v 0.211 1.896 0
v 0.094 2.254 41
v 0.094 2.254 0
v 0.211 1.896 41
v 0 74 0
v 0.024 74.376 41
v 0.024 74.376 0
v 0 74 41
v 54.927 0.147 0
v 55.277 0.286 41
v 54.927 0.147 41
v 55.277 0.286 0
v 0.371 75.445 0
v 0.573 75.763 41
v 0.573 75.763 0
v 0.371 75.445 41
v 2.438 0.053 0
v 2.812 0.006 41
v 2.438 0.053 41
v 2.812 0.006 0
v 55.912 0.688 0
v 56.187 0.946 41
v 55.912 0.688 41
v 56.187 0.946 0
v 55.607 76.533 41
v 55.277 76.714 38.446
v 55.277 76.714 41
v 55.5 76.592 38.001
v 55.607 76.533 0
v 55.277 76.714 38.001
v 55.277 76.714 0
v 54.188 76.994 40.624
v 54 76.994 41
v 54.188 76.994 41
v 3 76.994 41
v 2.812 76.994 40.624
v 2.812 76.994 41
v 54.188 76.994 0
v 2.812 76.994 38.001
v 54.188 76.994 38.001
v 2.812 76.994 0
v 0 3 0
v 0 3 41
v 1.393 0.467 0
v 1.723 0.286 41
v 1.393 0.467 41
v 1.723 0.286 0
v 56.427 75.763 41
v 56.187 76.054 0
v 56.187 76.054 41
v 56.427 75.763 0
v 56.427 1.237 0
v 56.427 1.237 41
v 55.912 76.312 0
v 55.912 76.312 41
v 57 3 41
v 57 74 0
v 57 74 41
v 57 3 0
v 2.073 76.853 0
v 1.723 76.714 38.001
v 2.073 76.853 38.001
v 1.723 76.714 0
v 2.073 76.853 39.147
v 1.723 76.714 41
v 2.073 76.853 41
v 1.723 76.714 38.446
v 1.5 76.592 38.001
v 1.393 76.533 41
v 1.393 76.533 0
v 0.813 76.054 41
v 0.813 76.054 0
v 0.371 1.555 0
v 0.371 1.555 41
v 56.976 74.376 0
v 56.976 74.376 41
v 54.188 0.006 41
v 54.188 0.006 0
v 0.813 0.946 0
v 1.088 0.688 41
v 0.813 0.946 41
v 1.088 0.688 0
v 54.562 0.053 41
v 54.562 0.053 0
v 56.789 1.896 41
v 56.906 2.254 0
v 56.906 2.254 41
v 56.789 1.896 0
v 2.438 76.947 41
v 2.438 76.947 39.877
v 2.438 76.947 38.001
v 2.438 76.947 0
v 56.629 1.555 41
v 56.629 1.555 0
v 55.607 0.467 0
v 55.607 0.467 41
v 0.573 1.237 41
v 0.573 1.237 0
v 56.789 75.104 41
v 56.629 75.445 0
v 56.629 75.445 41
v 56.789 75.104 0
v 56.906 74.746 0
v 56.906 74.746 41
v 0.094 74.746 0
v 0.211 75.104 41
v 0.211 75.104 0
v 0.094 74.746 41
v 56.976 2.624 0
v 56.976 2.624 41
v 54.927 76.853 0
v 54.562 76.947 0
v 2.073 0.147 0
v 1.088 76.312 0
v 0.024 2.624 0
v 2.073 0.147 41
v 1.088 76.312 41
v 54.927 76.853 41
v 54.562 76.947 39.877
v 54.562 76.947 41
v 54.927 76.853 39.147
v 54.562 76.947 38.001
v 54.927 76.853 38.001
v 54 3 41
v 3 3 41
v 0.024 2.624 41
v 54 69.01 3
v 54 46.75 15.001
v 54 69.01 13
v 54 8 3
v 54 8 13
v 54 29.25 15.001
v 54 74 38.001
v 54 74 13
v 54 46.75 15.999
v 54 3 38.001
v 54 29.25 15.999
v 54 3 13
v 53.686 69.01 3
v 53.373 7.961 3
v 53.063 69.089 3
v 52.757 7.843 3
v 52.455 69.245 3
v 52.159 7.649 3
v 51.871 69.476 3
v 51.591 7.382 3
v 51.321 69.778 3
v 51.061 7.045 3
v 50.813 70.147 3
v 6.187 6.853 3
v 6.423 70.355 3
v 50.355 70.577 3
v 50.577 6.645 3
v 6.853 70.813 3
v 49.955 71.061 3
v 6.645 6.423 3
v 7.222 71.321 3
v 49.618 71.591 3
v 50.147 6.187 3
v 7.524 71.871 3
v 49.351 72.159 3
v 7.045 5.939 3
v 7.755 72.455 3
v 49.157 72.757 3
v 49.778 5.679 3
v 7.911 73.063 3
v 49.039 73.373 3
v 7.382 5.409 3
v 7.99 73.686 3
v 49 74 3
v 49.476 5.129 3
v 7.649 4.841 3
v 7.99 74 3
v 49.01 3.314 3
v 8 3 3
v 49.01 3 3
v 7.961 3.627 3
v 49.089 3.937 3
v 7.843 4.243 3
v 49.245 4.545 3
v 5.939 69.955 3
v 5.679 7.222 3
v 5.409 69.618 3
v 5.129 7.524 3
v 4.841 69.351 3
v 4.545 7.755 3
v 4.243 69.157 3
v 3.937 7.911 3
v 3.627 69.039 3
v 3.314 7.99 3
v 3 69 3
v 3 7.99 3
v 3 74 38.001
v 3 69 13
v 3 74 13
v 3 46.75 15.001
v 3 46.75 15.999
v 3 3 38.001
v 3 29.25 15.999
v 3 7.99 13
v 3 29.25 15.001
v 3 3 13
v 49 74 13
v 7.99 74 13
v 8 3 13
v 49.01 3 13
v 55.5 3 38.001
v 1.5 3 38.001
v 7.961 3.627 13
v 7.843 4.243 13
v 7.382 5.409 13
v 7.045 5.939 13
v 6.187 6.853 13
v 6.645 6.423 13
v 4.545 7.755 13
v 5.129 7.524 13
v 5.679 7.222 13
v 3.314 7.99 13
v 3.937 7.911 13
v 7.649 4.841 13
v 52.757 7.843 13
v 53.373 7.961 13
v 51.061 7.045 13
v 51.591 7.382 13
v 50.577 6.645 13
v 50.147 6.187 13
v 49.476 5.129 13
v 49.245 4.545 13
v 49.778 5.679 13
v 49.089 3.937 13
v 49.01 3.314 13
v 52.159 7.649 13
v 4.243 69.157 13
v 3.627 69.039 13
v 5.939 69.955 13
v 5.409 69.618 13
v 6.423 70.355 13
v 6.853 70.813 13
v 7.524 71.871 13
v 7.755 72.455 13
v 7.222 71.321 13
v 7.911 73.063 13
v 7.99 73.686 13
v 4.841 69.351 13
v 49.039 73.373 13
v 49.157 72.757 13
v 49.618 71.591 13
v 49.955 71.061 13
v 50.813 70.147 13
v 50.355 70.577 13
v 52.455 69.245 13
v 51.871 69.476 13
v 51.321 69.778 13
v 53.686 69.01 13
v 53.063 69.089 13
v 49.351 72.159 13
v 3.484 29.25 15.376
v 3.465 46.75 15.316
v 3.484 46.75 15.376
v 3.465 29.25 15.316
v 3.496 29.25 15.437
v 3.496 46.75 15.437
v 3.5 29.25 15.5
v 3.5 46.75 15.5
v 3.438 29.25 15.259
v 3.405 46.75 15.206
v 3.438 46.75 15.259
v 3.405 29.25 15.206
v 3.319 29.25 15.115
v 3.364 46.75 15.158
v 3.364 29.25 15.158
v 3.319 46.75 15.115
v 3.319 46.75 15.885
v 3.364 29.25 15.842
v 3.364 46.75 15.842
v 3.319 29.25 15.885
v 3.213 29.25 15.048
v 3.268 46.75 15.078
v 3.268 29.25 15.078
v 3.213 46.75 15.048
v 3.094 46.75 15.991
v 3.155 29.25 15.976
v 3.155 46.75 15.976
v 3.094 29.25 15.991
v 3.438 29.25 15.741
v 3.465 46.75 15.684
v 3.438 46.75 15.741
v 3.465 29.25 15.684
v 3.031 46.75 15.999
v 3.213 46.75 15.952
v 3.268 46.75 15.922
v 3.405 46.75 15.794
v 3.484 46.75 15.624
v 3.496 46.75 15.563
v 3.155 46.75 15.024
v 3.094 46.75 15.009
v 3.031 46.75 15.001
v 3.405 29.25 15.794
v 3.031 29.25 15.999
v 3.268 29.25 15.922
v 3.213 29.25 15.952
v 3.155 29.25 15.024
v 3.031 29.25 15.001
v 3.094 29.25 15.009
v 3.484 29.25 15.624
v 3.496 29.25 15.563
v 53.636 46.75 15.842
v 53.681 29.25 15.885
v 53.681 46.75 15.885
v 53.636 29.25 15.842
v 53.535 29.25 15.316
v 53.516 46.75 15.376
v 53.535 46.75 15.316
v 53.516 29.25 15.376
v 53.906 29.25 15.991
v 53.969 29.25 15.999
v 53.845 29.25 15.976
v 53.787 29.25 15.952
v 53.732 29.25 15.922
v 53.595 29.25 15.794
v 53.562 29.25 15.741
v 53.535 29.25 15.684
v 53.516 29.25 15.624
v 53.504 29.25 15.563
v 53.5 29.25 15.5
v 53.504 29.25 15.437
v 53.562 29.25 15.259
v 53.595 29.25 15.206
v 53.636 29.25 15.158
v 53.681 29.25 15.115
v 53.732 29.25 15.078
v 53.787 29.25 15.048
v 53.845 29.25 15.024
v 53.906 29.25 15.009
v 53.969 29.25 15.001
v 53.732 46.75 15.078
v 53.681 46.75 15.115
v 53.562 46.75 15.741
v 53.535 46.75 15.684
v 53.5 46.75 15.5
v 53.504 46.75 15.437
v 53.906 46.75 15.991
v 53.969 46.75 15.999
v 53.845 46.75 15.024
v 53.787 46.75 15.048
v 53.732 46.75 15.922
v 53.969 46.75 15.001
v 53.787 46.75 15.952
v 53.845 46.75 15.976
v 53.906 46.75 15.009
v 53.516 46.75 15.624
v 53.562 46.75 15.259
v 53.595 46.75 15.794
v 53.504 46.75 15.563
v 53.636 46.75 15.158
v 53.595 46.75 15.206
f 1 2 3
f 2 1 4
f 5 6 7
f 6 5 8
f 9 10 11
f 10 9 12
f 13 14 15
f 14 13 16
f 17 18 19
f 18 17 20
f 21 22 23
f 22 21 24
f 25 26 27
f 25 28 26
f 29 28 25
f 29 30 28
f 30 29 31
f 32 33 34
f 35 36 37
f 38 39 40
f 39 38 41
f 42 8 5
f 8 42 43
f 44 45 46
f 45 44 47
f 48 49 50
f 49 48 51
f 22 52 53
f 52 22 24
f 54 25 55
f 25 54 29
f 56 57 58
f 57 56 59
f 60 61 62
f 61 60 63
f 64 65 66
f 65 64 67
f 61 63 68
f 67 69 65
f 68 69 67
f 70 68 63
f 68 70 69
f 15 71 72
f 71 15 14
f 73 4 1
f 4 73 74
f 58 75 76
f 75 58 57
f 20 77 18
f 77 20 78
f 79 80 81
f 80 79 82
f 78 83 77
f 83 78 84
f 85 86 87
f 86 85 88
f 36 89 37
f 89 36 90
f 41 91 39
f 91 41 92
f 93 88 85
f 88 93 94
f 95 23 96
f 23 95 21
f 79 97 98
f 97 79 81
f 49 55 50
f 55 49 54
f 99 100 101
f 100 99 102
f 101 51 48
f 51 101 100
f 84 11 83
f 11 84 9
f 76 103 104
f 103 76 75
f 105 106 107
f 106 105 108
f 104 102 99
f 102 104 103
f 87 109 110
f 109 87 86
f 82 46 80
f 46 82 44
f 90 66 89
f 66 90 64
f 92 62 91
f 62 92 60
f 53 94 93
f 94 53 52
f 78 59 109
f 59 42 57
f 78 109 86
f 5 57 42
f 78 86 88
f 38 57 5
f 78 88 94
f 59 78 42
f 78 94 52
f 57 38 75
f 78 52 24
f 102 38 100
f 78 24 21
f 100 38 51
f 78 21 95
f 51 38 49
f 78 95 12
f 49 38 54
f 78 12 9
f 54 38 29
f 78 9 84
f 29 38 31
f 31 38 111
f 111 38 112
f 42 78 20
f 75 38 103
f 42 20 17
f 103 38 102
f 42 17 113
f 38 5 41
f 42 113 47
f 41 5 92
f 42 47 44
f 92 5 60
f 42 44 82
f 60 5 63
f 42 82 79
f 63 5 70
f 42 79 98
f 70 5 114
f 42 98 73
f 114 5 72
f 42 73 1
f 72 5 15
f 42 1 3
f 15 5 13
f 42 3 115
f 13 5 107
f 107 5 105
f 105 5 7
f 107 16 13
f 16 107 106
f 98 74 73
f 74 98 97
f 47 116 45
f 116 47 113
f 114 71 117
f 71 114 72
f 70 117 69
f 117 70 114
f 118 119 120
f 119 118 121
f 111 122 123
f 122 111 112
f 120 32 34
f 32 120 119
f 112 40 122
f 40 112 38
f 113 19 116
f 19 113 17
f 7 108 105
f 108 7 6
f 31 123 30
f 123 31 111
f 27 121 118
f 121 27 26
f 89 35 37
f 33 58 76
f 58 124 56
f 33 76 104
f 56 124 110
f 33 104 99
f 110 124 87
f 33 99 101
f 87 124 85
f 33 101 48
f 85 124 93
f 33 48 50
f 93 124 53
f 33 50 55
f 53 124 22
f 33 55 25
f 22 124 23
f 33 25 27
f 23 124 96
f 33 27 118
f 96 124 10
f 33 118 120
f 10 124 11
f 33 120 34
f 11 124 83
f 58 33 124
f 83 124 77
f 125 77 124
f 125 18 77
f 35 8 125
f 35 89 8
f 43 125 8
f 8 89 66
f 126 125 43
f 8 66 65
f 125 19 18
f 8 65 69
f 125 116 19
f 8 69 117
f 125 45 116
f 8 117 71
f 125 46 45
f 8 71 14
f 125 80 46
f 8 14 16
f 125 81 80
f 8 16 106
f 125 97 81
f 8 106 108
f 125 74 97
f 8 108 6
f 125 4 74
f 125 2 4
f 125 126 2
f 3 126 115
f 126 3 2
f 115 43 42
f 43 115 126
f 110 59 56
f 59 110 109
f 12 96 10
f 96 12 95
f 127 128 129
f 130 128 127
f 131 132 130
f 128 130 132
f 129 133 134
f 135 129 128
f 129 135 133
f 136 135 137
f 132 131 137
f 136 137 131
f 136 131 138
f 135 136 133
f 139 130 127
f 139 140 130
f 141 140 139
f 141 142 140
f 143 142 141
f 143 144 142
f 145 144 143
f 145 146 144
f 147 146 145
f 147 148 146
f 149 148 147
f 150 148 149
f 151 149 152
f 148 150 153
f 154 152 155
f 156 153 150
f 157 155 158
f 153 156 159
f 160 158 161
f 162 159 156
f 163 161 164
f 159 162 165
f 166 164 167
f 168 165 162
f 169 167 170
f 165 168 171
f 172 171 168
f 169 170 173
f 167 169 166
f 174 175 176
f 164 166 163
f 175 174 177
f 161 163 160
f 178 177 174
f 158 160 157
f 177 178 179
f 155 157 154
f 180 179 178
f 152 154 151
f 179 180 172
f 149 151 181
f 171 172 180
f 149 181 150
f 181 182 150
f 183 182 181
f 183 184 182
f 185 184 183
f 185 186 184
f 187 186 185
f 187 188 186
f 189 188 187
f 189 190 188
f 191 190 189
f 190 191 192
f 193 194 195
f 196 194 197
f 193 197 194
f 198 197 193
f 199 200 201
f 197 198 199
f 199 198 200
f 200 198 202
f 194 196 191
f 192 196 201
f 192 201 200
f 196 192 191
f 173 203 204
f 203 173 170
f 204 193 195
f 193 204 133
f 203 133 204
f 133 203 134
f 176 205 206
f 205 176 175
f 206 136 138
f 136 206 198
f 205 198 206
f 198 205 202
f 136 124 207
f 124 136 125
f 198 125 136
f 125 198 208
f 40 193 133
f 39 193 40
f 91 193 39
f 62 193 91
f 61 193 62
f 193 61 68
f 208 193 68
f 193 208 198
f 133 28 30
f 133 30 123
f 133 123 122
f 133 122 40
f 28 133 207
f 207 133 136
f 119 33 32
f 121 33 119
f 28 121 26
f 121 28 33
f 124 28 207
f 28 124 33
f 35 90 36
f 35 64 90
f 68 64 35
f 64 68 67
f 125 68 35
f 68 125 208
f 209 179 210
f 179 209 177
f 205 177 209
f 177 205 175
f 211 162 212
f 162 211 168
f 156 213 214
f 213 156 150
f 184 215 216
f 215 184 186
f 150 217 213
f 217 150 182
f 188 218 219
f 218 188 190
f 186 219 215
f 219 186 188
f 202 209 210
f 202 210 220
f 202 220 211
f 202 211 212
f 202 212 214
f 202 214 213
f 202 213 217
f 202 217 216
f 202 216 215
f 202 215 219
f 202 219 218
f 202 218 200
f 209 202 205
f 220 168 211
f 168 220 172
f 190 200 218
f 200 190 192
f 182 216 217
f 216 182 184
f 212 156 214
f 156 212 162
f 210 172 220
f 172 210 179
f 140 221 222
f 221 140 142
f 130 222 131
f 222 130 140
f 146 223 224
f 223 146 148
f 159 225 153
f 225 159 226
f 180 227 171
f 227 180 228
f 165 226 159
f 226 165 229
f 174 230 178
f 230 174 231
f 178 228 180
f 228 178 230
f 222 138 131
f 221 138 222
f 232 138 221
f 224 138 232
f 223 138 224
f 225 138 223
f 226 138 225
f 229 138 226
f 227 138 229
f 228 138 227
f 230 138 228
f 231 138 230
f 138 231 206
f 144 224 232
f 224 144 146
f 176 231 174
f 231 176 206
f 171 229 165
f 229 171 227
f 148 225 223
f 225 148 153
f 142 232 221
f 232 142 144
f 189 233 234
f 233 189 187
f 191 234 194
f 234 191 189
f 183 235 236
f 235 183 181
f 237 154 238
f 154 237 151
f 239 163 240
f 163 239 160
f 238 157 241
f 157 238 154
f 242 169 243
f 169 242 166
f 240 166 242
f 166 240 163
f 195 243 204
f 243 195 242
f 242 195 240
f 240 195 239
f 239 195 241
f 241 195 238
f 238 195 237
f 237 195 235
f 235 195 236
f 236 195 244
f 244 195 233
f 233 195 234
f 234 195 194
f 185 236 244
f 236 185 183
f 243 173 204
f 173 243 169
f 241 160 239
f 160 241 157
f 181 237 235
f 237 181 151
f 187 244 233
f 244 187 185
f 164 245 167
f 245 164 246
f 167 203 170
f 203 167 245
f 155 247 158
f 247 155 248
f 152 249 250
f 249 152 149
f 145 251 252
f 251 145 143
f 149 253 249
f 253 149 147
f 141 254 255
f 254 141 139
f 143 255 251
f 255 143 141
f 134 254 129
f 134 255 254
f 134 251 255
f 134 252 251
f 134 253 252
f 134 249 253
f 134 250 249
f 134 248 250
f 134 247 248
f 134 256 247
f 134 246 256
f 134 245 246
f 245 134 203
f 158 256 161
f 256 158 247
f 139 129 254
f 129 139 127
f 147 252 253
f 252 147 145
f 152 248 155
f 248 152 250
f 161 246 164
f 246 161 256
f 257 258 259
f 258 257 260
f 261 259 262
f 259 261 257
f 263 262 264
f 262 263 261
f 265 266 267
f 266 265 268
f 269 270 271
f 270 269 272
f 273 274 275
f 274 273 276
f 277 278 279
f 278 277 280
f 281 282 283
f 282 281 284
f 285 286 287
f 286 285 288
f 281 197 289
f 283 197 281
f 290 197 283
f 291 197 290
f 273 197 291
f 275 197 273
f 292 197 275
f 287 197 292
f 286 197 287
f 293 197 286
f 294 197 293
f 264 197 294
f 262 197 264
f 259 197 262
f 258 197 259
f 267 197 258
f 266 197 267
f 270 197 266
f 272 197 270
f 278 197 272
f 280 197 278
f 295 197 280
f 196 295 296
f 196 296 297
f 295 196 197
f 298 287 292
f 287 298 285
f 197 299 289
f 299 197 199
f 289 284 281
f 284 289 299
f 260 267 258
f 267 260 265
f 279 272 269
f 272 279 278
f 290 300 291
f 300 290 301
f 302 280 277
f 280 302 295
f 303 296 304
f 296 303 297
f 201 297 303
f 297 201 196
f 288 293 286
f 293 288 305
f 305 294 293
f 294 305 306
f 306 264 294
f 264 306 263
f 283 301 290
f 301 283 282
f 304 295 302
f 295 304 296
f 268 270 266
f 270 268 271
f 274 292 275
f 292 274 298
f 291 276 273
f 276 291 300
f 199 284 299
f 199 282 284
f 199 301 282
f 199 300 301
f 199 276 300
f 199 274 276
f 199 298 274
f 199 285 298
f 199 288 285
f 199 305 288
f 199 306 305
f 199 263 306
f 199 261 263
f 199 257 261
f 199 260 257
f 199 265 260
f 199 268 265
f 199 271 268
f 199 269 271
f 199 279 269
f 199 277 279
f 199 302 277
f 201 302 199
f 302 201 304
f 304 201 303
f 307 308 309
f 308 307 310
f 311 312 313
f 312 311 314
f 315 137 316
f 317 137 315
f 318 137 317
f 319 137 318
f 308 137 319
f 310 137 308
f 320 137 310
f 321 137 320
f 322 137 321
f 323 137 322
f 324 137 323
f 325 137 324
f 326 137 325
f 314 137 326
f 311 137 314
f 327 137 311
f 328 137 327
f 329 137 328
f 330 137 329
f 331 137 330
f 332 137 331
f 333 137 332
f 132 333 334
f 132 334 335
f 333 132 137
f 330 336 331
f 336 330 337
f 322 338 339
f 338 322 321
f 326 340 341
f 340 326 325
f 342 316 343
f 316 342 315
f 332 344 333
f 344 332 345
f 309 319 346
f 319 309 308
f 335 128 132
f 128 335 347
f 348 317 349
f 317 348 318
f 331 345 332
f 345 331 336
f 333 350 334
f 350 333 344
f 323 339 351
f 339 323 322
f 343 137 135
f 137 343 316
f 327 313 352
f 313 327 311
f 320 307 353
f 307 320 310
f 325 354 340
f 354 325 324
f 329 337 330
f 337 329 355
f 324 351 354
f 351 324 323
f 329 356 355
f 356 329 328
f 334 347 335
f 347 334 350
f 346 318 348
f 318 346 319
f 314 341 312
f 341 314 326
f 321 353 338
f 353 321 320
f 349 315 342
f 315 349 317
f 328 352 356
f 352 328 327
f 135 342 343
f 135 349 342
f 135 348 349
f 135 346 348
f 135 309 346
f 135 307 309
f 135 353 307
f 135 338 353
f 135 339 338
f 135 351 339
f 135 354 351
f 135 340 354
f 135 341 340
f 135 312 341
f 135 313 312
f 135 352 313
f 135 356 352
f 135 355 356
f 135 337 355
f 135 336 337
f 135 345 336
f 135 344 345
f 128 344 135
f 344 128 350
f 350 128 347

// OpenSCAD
/* Project box

   A parametric box for electronics projects using perforated circuit boards. The
   board is held above the bottom of the box by four corner supports, and snaps
   into place to hold it snugly while allowing easy removal.
*/

$fn=50;

mode = "case";         // ["case", "lid", "all"]
board_x = 50;
board_y = 70;
board_thickness = 1;   // [1:10]
clearance_above = 20;  // [5:50]
clearance_below = 10;  // [5:50]
fit_tolerance = 0.5;
corner_radius=3;       // [1:10]
support_radius=5;      // [1:10]
wall_width=3;          // [3:10]

module _rounded_box(h, w, d, r) {
  hull() {
    translate([0 + r,0 + r,0])
      cylinder(h=h,r=r);
    translate([w - r,0 + r,0])
      cylinder(h=h, r=r);
    translate([w - r,d - r,0])
      cylinder(h=h, r=r);
    translate([0 + r,d - r,0])
      cylinder(h=h, r=r);
  }

}

module corner_post(h, r) {
  intersection() {
    translate([-0.001,-0.001,-0.001])
      cube([r*1.1, r*1.1, h*1.2]);
    cylinder(h=h, r=r);
  }
}

module lid_base(x, y, z, slot_depth=1.5) {
  polyhedron([// bottom face
              [0, 0, 0],
              [x, 0, 0],
              [x, y, 0],
              [0, y, 0],
              // top face
              [slot_depth, 0, z],
              [x - slot_depth, 0, z],
              [x - slot_depth, y, z],
              [slot_depth, y, z]],
             [[0,1,2,3],
              [4,5,1,0],
              [7,6,5,4],
              [5,6,2,1],
              [6,7,3,2],
              [7,4,0,3]]);
}

module lid(x, y, z, slot_depth=1.5, wall_width=3, fit_tolerance=0.5) {
  indent_width = x / 4;
  difference() {
    union() {
      lid_base(x, y, z, slot_depth);
      translate([x / 2 - indent_width / 2 - fit_tolerance, y - wall_width - fit_tolerance, 0])
        rotate([0, 90, 0])
        cylinder(h=x / 4, r=2*fit_tolerance);
    }
    translate([x / 2 - indent_width / 2 - fit_tolerance, y - wall_width - fit_tolerance, z])
      rotate([0, 90, 0])
      cylinder(h=x / 4, r=2*fit_tolerance);
  }
}

module project_box(x, y,
                   above=20,
                   below=10,
                   board_thickness=1,
                   fit_tolerance=0.5,
                   corner_radius=3,
                   support_radius=5,
                   wall_width=3,
                   mode="case") {
  width=board_x + (fit_tolerance * 2);
  depth=board_y + (fit_tolerance * 2);
  lid_width = width + wall_width; // Extends halfway into each side wall
  lid_depth = depth + wall_width; // Extends out of one wall
  lid_height = wall_width;        // Replaces most of the top wall
  height=board_thickness + above + below + (fit_tolerance * 2) + lid_height;

  // lid
  if (mode == "all") {
    translate([wall_width / 2 + fit_tolerance, wall_width + fit_tolerance, height + wall_width + fit_tolerance]) {
      lid(lid_width - (fit_tolerance * 2), lid_depth - (fit_tolerance * 2), lid_height - (fit_tolerance * 2));
    }
  } else if (mode == "lid") {
    // Flip the lid and translate it into place for printing
    translate([lid_width - (fit_tolerance * 2),0,lid_height - (fit_tolerance * 2)])
      rotate([0, 180, 0])
      lid(lid_width - (fit_tolerance * 2), lid_depth - (fit_tolerance * 2), lid_height - (fit_tolerance * 2));
  }

  // case
  if ((mode == "case") || (mode == "all")) {
    difference() {
      _rounded_box(h=height + (wall_width * 2),
                   w=width + (wall_width * 2),
                   d=depth + (wall_width * 2),
                   r=corner_radius);
      translate([wall_width,wall_width,wall_width])
        cube([width, depth, height + (wall_width * 2)]);
      // lid slot
      translate([wall_width / 2, wall_width, height + wall_width + 0.001]) {
        lid_base(lid_width, lid_depth, lid_height);
      }
    }

    // supports
    translate([wall_width,wall_width,wall_width]) {
      translate([0,0,0])
        corner_post(h=below, r=support_radius);
      translate([width,0,0])
        rotate([0,0,90])
        corner_post(h=below, r=support_radius);
      translate([0,depth,0])
        rotate([0,0,270])
        corner_post(h=below, r=support_radius);
      translate([width,depth,0])
        rotate([0,0,180])
        corner_post(h=below, r=support_radius);
    }


    // locking nubs
    translate([wall_width,wall_width,wall_width]) {
      nub_size = fit_tolerance * 2;
      nub_width = board_y / 4;
      nub_height = below + board_thickness + (nub_size/2) + (fit_tolerance*2);
      translate([0,board_y / 2 - nub_width / 2,nub_height])
        rotate([270,0,0])
        cylinder(h=nub_width, r=nub_size/2);
      translate([width,board_y / 2 - nub_width / 2,nub_height])
        rotate([270,0,0])
        cylinder(h=nub_width, r=nub_size/2);
    }
  }
}

project_box(board_x, board_y,
            above=clearance_above,
            below=clearance_below,
            board_thickness=board_thickness,
            fit_tolerance=fit_tolerance,
            corner_radius=corner_radius,
            support_radius=support_radius,
            wall_width=wall_width,
            mode=mode);
